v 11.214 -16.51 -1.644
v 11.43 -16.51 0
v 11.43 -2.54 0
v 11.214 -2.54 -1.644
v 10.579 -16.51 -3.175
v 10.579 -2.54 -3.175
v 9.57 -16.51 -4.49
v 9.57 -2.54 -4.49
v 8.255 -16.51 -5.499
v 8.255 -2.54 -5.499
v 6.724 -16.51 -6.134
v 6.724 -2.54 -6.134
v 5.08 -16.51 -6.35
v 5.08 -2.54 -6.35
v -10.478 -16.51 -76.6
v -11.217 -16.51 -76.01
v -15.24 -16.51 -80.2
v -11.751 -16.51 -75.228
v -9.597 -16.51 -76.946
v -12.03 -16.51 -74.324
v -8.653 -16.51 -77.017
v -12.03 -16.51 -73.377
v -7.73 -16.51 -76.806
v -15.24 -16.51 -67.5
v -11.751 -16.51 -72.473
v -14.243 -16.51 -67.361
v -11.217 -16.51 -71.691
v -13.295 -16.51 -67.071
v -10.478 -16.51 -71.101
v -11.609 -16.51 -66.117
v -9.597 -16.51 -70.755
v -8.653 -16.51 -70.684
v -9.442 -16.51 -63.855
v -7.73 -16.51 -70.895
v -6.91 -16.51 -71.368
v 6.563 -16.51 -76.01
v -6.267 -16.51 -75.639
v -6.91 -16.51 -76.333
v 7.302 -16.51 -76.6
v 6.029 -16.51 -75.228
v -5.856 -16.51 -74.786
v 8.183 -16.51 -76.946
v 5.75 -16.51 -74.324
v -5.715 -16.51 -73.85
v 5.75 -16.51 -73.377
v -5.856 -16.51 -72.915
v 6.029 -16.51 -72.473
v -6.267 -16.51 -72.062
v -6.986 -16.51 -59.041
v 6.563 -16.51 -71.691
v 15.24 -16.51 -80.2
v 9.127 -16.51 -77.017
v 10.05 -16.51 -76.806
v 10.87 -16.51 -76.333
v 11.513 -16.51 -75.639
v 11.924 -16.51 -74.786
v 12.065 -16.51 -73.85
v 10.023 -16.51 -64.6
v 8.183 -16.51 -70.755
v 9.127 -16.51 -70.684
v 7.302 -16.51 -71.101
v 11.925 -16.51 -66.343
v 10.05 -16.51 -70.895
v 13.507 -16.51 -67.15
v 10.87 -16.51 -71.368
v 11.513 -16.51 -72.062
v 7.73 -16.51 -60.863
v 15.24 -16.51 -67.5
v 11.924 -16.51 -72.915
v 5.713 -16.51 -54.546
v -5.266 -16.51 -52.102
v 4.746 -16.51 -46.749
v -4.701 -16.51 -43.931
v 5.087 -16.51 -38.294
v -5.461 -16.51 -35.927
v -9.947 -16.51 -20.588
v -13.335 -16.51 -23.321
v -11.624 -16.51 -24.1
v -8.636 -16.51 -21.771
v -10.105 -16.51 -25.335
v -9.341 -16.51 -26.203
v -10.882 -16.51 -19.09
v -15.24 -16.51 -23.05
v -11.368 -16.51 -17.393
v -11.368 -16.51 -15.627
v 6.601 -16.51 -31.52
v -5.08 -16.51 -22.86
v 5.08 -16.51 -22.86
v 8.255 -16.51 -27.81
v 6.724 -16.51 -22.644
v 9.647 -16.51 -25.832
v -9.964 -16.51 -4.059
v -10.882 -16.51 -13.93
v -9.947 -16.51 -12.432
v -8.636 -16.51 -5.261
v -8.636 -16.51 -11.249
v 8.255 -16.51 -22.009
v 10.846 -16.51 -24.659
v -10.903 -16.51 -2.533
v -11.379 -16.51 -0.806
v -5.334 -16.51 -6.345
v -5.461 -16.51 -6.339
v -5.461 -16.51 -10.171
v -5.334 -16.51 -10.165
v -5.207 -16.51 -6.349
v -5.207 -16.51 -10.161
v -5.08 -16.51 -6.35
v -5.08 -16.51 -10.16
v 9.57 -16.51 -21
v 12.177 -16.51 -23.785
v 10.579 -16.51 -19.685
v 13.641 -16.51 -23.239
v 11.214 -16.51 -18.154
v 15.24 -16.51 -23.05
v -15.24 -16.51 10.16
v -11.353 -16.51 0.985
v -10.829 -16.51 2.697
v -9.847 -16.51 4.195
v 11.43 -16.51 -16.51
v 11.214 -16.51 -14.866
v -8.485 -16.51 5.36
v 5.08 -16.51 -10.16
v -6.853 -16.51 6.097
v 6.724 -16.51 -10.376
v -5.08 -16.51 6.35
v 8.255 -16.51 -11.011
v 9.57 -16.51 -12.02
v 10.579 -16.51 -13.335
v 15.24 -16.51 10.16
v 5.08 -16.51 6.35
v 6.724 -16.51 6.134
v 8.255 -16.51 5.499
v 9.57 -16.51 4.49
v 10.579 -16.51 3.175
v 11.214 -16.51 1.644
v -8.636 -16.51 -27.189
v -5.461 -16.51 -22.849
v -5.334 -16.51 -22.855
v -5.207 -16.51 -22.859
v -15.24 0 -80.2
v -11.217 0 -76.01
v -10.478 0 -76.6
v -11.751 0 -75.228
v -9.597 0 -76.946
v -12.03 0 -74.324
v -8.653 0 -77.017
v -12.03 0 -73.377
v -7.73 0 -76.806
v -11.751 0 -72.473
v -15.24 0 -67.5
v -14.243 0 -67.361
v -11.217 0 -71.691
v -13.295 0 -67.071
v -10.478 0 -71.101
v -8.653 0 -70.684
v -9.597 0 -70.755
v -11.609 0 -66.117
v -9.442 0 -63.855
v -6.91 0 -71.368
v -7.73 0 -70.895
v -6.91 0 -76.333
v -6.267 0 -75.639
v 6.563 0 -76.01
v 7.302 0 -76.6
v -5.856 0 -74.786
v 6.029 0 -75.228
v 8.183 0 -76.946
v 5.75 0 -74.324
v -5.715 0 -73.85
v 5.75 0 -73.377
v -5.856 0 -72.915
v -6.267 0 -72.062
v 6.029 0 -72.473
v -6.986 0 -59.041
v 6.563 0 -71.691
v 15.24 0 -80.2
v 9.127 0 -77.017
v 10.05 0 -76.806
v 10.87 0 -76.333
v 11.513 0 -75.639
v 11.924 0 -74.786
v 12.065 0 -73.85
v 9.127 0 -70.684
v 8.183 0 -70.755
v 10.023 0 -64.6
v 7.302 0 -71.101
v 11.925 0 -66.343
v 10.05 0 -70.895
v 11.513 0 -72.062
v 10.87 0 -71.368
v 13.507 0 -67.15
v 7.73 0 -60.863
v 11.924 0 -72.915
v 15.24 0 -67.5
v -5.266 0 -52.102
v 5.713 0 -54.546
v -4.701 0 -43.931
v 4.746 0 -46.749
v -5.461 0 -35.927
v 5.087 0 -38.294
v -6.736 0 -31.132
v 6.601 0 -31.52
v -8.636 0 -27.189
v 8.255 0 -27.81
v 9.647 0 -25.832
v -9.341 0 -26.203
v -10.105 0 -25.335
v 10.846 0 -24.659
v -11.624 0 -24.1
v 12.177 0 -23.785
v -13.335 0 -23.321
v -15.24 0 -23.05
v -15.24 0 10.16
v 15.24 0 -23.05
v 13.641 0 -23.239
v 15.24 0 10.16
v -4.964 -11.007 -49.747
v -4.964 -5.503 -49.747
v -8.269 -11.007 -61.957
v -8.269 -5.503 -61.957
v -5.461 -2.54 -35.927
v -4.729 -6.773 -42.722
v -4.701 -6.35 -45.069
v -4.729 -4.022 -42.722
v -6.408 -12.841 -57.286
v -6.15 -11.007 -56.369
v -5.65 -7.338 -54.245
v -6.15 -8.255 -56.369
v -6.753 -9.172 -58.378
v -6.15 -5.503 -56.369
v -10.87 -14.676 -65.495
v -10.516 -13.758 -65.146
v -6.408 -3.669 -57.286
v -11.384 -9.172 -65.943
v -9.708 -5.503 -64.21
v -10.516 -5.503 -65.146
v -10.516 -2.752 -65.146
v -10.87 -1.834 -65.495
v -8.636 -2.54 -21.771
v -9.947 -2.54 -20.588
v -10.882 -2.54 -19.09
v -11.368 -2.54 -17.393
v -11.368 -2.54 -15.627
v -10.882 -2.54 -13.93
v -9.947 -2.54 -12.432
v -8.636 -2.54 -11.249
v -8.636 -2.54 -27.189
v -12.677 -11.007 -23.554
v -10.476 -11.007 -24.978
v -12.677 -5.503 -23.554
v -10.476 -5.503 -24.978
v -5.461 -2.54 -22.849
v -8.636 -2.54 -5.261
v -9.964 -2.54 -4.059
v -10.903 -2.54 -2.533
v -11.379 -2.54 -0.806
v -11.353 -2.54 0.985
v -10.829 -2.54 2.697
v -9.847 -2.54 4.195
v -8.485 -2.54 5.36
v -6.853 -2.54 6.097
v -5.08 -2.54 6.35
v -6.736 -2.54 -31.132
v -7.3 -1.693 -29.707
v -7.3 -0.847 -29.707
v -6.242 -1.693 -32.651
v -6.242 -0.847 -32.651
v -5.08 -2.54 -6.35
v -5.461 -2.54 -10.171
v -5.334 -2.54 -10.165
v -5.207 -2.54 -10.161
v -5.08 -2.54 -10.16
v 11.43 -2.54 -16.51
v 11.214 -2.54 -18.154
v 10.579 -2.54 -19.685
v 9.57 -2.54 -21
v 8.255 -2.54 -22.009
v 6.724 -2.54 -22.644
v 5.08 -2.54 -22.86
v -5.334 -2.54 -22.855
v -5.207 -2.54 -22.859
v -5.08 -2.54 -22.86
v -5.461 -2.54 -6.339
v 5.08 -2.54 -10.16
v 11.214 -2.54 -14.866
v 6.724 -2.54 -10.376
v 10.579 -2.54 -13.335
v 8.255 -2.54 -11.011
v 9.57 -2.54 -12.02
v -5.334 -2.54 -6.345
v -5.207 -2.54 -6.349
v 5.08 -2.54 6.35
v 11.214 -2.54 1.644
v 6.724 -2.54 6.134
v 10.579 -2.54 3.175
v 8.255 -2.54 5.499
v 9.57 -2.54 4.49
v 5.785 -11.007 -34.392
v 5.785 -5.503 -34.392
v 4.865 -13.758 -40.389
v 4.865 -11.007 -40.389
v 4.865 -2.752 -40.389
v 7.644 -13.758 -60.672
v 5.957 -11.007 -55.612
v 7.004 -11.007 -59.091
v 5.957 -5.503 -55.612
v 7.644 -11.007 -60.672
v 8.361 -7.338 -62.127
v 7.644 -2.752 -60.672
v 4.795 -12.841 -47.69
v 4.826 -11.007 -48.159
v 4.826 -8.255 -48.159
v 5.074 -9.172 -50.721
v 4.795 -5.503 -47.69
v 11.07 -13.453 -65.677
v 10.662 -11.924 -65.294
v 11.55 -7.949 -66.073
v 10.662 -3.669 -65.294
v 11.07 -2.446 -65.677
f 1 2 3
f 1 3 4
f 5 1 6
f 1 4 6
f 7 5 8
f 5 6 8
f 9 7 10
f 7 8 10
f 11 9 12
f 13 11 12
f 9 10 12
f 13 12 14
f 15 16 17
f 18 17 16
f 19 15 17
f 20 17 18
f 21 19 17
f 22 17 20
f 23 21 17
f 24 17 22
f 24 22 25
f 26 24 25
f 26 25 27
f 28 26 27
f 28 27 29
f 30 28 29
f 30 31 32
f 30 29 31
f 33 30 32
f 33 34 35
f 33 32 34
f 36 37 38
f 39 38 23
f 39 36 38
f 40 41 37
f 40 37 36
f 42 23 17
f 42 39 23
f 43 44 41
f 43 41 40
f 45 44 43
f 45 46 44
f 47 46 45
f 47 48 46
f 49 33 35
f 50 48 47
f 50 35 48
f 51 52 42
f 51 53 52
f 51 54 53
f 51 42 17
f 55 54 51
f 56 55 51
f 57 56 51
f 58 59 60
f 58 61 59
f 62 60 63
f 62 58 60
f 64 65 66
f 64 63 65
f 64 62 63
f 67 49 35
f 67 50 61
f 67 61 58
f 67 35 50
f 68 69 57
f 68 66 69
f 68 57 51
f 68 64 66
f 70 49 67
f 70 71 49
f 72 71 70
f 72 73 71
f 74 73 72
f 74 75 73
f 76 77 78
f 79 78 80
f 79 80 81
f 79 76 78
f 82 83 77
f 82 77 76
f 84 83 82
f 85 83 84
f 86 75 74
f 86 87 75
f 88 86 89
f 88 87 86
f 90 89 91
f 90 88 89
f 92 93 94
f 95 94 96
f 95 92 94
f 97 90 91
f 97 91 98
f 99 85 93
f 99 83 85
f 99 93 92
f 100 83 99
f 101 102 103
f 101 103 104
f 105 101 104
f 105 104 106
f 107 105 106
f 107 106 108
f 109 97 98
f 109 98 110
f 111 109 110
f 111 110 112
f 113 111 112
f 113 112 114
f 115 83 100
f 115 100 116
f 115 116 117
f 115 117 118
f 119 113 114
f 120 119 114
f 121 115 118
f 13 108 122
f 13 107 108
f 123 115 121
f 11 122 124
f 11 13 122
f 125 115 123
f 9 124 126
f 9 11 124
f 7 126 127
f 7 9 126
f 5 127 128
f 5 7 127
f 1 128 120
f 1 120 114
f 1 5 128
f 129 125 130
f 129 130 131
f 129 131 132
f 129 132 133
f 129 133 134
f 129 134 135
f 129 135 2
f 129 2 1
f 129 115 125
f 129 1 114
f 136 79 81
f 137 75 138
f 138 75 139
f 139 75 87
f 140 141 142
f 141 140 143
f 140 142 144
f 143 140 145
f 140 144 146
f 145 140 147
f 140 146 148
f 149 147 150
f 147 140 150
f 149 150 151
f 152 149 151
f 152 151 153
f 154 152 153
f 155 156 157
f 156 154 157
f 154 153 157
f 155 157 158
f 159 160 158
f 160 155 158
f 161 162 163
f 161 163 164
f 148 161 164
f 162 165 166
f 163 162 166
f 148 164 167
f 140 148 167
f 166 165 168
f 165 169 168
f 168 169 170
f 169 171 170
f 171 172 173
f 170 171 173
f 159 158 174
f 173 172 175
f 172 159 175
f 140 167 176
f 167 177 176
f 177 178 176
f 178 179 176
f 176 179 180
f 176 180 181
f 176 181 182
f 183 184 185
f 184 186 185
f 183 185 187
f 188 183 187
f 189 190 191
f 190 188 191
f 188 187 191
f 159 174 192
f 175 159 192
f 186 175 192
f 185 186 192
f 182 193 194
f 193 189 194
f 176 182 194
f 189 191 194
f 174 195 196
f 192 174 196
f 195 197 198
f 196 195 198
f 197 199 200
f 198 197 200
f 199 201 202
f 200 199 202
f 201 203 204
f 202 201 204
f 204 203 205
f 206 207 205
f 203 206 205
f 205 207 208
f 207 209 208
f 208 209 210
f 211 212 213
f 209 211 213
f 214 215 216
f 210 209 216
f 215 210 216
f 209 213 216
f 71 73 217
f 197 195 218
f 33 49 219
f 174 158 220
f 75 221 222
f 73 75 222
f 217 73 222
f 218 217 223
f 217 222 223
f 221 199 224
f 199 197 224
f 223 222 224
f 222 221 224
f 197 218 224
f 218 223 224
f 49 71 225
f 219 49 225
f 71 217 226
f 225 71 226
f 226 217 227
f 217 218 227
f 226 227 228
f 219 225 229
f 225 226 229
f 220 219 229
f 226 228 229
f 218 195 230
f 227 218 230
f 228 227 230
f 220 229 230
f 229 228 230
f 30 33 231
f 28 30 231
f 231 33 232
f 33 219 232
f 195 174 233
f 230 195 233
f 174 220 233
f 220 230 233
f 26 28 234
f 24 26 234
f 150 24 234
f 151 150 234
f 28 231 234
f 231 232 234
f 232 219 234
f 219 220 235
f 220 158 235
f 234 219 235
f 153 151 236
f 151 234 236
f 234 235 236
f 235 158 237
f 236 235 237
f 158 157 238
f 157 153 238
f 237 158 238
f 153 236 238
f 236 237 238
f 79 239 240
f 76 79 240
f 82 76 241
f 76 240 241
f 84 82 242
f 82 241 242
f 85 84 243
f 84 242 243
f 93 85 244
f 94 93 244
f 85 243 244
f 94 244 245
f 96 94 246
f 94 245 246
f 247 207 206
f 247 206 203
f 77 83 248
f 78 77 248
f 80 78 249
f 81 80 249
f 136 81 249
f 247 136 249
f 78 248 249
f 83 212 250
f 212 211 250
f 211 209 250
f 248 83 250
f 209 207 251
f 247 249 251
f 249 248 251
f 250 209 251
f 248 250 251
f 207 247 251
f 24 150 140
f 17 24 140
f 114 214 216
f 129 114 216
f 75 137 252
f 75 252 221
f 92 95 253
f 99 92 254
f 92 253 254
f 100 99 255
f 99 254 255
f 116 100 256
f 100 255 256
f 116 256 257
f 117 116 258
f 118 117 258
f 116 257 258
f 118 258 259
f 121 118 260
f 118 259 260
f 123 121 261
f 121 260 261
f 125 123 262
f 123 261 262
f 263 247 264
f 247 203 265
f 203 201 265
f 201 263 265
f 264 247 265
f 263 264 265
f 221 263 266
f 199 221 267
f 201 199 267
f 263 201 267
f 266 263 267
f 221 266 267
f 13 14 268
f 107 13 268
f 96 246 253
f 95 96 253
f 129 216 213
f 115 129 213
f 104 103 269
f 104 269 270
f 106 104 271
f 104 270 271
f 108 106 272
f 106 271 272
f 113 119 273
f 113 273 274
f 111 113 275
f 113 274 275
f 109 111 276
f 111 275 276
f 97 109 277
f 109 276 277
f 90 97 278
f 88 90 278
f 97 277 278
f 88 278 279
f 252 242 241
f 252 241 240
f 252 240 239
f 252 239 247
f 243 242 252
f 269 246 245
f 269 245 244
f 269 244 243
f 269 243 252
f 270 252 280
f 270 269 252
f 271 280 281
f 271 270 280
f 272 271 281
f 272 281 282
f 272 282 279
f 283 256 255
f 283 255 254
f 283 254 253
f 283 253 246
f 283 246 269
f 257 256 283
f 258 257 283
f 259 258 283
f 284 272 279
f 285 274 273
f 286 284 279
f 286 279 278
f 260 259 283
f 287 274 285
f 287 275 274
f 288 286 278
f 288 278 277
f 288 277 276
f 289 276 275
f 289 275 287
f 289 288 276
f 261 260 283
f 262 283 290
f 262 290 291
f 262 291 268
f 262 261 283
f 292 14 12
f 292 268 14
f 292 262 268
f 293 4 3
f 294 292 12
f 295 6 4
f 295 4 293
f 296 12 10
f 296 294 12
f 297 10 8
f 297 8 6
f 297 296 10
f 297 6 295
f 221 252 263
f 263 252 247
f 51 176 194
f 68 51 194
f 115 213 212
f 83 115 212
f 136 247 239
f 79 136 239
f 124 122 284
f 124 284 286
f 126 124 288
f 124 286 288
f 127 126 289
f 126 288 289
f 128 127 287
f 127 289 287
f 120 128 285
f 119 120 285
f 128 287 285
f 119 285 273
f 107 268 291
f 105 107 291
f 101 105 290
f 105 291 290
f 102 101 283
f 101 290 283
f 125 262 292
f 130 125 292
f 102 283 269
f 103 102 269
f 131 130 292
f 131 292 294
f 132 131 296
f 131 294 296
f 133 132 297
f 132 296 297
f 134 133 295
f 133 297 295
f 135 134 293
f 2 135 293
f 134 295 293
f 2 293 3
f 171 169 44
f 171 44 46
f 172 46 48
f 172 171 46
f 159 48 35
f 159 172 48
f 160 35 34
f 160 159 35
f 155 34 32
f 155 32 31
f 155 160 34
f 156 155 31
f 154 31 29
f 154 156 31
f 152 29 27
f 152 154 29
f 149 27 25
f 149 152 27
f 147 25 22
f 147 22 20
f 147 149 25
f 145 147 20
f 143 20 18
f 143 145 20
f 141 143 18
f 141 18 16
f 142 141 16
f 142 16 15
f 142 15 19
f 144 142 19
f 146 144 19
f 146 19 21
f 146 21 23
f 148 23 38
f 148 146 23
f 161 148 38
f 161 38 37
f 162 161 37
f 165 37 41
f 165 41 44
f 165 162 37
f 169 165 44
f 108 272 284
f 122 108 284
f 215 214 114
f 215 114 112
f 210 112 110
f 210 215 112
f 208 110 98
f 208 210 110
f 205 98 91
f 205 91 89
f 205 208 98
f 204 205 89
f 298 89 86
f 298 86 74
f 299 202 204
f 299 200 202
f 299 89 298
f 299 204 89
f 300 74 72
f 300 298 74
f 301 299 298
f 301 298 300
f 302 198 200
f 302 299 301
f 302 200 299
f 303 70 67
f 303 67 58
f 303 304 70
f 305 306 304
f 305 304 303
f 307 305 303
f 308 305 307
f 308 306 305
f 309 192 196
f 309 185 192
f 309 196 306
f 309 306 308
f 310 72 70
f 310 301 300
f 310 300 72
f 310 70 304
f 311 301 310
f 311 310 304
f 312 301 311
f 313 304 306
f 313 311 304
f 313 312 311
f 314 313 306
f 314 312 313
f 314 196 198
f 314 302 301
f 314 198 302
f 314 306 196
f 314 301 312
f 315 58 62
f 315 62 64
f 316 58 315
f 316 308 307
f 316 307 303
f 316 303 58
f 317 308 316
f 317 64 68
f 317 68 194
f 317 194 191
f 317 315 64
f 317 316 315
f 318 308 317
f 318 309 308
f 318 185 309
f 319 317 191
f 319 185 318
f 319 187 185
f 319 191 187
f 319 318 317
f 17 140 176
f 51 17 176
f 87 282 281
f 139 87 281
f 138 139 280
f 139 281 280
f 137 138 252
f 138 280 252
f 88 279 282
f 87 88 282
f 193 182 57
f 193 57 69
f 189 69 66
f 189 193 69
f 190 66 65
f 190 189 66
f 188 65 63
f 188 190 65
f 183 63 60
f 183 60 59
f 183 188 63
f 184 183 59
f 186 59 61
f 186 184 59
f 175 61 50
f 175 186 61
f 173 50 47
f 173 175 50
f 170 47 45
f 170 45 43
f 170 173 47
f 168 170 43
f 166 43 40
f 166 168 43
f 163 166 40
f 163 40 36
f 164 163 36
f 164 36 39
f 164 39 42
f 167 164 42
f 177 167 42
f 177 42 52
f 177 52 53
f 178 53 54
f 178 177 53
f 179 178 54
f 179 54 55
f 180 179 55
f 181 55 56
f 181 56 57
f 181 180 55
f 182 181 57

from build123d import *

# Parameters (mm, degrees)
F0_R     = 3.175
F1_DEPTH = 16.51
F2_DEPTH = 2.54


# Not quite as in the source:
# - a feature names something its author has since deleted; it is built from what else it names


with BuildPart() as f1:
    # F0 (on Front) → F1 (new body)
    with BuildSketch(Plane.XZ):
        with BuildLine():
            Line((15.24, 10.16), (0, 10.16))
            Line((0, 10.16), (-15.24, 10.16))
            Line((-15.24, 10.16), (-15.24, -23.0504914403))
            add(Edge.make_bspline(
                [(-15.24, -23.0504914403), (-12.4936951429, -23.050233708), (-10.2976989889, -24.6278435924), (-8.636, -27.1888607202)],
                knots=[0, 0, 0, 0, 8.4526904957, 8.4526904957, 8.4526904957, 8.4526904957], degree=3))
            Line((-8.636, -27.1888607202), (-8.636, -21.770928055))
            ThreePointArc((-8.636, -21.770928055), (-11.43, -16.51), (-8.636, -11.249071945))
            Line((-8.636, -11.249071945), (-8.636, -5.260928055))
            ThreePointArc((-8.636, -5.260928055), (-11.1516304709, 1.8595169871), (-5.08, 6.35))
            Line((-5.08, 6.35), (5.08, 6.35))
            ThreePointArc((5.08, 6.35), (9.5701280605, 4.4901280605), (11.43, 0))
            ThreePointArc((11.43, 0), (9.5701280605, -4.4901280605), (5.08, -6.35))
            Line((5.08, -6.35), (-5.08, -6.35))
            ThreePointArc((-5.08, -6.35), (-5.2705858603, -6.3471392792), (-5.461, -6.3385596944))
            Line((-5.461, -6.3385596944), (-5.461, -10.1714403056))
            ThreePointArc((-5.461, -10.1714403056), (-5.2705858603, -10.1628607208), (-5.08, -10.16))
            Line((-5.08, -10.16), (5.08, -10.16))
            ThreePointArc((5.08, -10.16), (9.5701280605, -12.0198719395), (11.43, -16.51))
            ThreePointArc((11.43, -16.51), (9.5701280605, -21.0001280605), (5.08, -22.86))
            Line((5.08, -22.86), (-5.08, -22.86))
            ThreePointArc((-5.08, -22.86), (-5.2705858603, -22.8571392792), (-5.461, -22.8485596944))
            Line((-5.461, -22.8485596944), (-5.461, -35.926681818))
            add(Edge.make_bspline(
                [(-5.461, -35.926681818), (-3.0177559473, -48.8656738837), (-6.4817336355, -66.9757324356), (-15.24, -67.5004914403)],
                knots=[15.9624587288, 15.9624587288, 15.9624587288, 15.9624587288, 44.45, 44.45, 44.45, 44.45], degree=3))
            Line((-15.24, -67.5004914403), (-15.24, -80.2004914403))
            Line((-15.24, -80.2004914403), (0, -80.2004914403))
            Line((0, -80.2004914403), (15.24, -80.2004914403))
            Line((15.24, -80.2004914403), (15.24, -67.5004914403))
            add(Edge.make_bspline(
                [(15.24, -23.0504914403), (0.7980597731, -23.0491361081), (1.5742035665, -66.6816935827), (15.24, -67.5004914403)],
                knots=[0, 0, 0, 0, 44.45, 44.45, 44.45, 44.45], degree=3))
            Line((15.24, -23.0504914403), (15.24, 10.16))
        make_face()
        with Locations((-8.89, -73.8504914403)):
            Circle(F0_R, mode=Mode.SUBTRACT)
        with Locations((8.89, -73.8504914403)):
            Circle(F0_R, mode=Mode.SUBTRACT)
    extrude(amount=F1_DEPTH)

    # F0 (on Front) → F2 (join)
    with BuildSketch(Plane.XZ):
        with BuildLine():
            ThreePointArc((-5.08, 6.35), (-11.1516304709, 1.8595169871), (-8.636, -5.260928055))
            ThreePointArc((-8.636, -5.260928055), (-7.1209102718, -6.0130845048), (-5.461, -6.3385596944))
            ThreePointArc((-5.461, -6.3385596944), (-5.2705858603, -6.3471392792), (-5.08, -6.35))
            ThreePointArc((-5.08, -6.35), (-2.2401936686, -5.6796126628), (0, -3.81))
            ThreePointArc((0, -3.81), (-1.27, 0), (0, 3.81))
            ThreePointArc((0, 3.81), (-2.2401936686, 5.6796126628), (-5.08, 6.35))
        make_face()
        with BuildLine():
            ThreePointArc((5.08, 6.35), (2.2401936686, 5.6796126628), (0, 3.81))
            ThreePointArc((0, 3.81), (0.9441389426, 2.0080463142), (1.27, 0))
            ThreePointArc((1.27, 0), (0.9441389426, -2.0080463142), (0, -3.81))
            ThreePointArc((0, -3.81), (2.2401936686, -5.6796126628), (5.08, -6.35))
            ThreePointArc((5.08, -6.35), (9.5701280605, -4.4901280605), (11.43, 0))
            ThreePointArc((11.43, 0), (9.5701280605, 4.4901280605), (5.08, 6.35))
        make_face()
        with BuildLine():
            Line((5.08, 6.35), (-5.08, 6.35))
            ThreePointArc((-5.08, 6.35), (-2.2401936686, 5.6796126628), (0, 3.81))
            ThreePointArc((0, 3.81), (2.2401936686, 5.6796126628), (5.08, 6.35))
        make_face()
        with BuildLine():
            ThreePointArc((1.27, 0), (0.9441389426, 2.0080463142), (0, 3.81))
            ThreePointArc((0, 3.81), (-1.27, 0), (0, -3.81))
            ThreePointArc((0, -3.81), (0.9441389426, -2.0080463142), (1.27, 0))
        make_face()
        with BuildLine():
            ThreePointArc((0, -3.81), (-2.2401936686, -5.6796126628), (-5.08, -6.35))
            Line((-5.08, -6.35), (5.08, -6.35))
            ThreePointArc((5.08, -6.35), (2.2401936686, -5.6796126628), (0, -3.81))
        make_face()
        with BuildLine():
            Line((-5.461, -22.5981636269), (-5.461, -22.8485596944))
            ThreePointArc((-5.461, -22.8485596944), (-5.2705858603, -22.8571392792), (-5.08, -22.86))
            ThreePointArc((-5.08, -22.86), (-2.2401936686, -22.1896126628), (0, -20.32))
            ThreePointArc((0, -20.32), (-1.27, -16.51), (0, -12.7))
            ThreePointArc((0, -12.7), (-2.2401936686, -10.8303873372), (-5.08, -10.16))
            ThreePointArc((-5.08, -10.16), (-5.2705858603, -10.1628607208), (-5.461, -10.1714403056))
            Line((-5.461, -10.1714403056), (-5.461, -22.5981636269))
        make_face()
        with BuildLine():
            ThreePointArc((0, -12.7), (-1.27, -16.51), (0, -20.32))
            ThreePointArc((0, -20.32), (0.9441389426, -18.5180463142), (1.27, -16.51))
            ThreePointArc((1.27, -16.51), (0.9441389426, -14.5019536858), (0, -12.7))
        make_face()
        with BuildLine():
            Line((5.08, -10.16), (-5.08, -10.16))
            ThreePointArc((-5.08, -10.16), (-2.2401936686, -10.8303873372), (0, -12.7))
            ThreePointArc((0, -12.7), (2.2401936686, -10.8303873372), (5.08, -10.16))
        make_face()
        with BuildLine():
            ThreePointArc((1.27, -16.51), (0.9441389426, -18.5180463142), (0, -20.32))
            ThreePointArc((0, -20.32), (2.2401936686, -22.1896126628), (5.08, -22.86))
            ThreePointArc((5.08, -22.86), (9.5701280605, -21.0001280605), (11.43, -16.51))
            ThreePointArc((11.43, -16.51), (9.5701280605, -12.0198719395), (5.08, -10.16))
            ThreePointArc((5.08, -10.16), (2.2401936686, -10.8303873372), (0, -12.7))
            ThreePointArc((0, -12.7), (0.9441389426, -14.5019536858), (1.27, -16.51))
        make_face()
        with BuildLine():
            ThreePointArc((0, -20.32), (-2.2401936686, -22.1896126628), (-5.08, -22.86))
            Line((-5.08, -22.86), (5.08, -22.86))
            ThreePointArc((5.08, -22.86), (2.2401936686, -22.1896126628), (0, -20.32))
        make_face()
        with BuildLine():
            Line((-8.636, -21.770928055), (-8.636, -27.1888607202))
            add(Edge.make_bspline(
                [(-8.636, -27.1888607202), (-7.1596683768, -29.4641889225), (-6.1050779286, -32.5157580511), (-5.461, -35.926681818)],
                knots=[8.4526904957, 8.4526904957, 8.4526904957, 8.4526904957, 15.9624587288, 15.9624587288, 15.9624587288, 15.9624587288], degree=3))
            Line((-5.461, -35.926681818), (-5.461, -22.8485596944))
            ThreePointArc((-5.461, -22.8485596944), (-7.1209102718, -22.5230845048), (-8.636, -21.770928055))
        make_face()
        with BuildLine():
            Line((-8.636, -5.260928055), (-8.636, -11.249071945))
            ThreePointArc((-8.636, -11.249071945), (-7.1209102718, -10.4969154952), (-5.461, -10.1714403056))
            Line((-5.461, -10.1714403056), (-5.461, -6.3385596944))
            ThreePointArc((-5.461, -6.3385596944), (-7.1209102718, -6.0130845048), (-8.636, -5.260928055))
        make_face()
        with BuildLine():
            ThreePointArc((-8.636, -11.249071945), (-11.43, -16.51), (-8.636, -21.770928055))
            ThreePointArc((-8.636, -21.770928055), (-7.1209102718, -22.5230845048), (-5.461, -22.8485596944))
            Line((-5.461, -22.8485596944), (-5.461, -22.5981636269))
            Line((-5.461, -22.5981636269), (-5.461, -10.1714403056))
            ThreePointArc((-5.461, -10.1714403056), (-7.1209102718, -10.4969154952), (-8.636, -11.249071945))
        make_face()
    extrude(amount=F2_DEPTH)


solid = f1.part
